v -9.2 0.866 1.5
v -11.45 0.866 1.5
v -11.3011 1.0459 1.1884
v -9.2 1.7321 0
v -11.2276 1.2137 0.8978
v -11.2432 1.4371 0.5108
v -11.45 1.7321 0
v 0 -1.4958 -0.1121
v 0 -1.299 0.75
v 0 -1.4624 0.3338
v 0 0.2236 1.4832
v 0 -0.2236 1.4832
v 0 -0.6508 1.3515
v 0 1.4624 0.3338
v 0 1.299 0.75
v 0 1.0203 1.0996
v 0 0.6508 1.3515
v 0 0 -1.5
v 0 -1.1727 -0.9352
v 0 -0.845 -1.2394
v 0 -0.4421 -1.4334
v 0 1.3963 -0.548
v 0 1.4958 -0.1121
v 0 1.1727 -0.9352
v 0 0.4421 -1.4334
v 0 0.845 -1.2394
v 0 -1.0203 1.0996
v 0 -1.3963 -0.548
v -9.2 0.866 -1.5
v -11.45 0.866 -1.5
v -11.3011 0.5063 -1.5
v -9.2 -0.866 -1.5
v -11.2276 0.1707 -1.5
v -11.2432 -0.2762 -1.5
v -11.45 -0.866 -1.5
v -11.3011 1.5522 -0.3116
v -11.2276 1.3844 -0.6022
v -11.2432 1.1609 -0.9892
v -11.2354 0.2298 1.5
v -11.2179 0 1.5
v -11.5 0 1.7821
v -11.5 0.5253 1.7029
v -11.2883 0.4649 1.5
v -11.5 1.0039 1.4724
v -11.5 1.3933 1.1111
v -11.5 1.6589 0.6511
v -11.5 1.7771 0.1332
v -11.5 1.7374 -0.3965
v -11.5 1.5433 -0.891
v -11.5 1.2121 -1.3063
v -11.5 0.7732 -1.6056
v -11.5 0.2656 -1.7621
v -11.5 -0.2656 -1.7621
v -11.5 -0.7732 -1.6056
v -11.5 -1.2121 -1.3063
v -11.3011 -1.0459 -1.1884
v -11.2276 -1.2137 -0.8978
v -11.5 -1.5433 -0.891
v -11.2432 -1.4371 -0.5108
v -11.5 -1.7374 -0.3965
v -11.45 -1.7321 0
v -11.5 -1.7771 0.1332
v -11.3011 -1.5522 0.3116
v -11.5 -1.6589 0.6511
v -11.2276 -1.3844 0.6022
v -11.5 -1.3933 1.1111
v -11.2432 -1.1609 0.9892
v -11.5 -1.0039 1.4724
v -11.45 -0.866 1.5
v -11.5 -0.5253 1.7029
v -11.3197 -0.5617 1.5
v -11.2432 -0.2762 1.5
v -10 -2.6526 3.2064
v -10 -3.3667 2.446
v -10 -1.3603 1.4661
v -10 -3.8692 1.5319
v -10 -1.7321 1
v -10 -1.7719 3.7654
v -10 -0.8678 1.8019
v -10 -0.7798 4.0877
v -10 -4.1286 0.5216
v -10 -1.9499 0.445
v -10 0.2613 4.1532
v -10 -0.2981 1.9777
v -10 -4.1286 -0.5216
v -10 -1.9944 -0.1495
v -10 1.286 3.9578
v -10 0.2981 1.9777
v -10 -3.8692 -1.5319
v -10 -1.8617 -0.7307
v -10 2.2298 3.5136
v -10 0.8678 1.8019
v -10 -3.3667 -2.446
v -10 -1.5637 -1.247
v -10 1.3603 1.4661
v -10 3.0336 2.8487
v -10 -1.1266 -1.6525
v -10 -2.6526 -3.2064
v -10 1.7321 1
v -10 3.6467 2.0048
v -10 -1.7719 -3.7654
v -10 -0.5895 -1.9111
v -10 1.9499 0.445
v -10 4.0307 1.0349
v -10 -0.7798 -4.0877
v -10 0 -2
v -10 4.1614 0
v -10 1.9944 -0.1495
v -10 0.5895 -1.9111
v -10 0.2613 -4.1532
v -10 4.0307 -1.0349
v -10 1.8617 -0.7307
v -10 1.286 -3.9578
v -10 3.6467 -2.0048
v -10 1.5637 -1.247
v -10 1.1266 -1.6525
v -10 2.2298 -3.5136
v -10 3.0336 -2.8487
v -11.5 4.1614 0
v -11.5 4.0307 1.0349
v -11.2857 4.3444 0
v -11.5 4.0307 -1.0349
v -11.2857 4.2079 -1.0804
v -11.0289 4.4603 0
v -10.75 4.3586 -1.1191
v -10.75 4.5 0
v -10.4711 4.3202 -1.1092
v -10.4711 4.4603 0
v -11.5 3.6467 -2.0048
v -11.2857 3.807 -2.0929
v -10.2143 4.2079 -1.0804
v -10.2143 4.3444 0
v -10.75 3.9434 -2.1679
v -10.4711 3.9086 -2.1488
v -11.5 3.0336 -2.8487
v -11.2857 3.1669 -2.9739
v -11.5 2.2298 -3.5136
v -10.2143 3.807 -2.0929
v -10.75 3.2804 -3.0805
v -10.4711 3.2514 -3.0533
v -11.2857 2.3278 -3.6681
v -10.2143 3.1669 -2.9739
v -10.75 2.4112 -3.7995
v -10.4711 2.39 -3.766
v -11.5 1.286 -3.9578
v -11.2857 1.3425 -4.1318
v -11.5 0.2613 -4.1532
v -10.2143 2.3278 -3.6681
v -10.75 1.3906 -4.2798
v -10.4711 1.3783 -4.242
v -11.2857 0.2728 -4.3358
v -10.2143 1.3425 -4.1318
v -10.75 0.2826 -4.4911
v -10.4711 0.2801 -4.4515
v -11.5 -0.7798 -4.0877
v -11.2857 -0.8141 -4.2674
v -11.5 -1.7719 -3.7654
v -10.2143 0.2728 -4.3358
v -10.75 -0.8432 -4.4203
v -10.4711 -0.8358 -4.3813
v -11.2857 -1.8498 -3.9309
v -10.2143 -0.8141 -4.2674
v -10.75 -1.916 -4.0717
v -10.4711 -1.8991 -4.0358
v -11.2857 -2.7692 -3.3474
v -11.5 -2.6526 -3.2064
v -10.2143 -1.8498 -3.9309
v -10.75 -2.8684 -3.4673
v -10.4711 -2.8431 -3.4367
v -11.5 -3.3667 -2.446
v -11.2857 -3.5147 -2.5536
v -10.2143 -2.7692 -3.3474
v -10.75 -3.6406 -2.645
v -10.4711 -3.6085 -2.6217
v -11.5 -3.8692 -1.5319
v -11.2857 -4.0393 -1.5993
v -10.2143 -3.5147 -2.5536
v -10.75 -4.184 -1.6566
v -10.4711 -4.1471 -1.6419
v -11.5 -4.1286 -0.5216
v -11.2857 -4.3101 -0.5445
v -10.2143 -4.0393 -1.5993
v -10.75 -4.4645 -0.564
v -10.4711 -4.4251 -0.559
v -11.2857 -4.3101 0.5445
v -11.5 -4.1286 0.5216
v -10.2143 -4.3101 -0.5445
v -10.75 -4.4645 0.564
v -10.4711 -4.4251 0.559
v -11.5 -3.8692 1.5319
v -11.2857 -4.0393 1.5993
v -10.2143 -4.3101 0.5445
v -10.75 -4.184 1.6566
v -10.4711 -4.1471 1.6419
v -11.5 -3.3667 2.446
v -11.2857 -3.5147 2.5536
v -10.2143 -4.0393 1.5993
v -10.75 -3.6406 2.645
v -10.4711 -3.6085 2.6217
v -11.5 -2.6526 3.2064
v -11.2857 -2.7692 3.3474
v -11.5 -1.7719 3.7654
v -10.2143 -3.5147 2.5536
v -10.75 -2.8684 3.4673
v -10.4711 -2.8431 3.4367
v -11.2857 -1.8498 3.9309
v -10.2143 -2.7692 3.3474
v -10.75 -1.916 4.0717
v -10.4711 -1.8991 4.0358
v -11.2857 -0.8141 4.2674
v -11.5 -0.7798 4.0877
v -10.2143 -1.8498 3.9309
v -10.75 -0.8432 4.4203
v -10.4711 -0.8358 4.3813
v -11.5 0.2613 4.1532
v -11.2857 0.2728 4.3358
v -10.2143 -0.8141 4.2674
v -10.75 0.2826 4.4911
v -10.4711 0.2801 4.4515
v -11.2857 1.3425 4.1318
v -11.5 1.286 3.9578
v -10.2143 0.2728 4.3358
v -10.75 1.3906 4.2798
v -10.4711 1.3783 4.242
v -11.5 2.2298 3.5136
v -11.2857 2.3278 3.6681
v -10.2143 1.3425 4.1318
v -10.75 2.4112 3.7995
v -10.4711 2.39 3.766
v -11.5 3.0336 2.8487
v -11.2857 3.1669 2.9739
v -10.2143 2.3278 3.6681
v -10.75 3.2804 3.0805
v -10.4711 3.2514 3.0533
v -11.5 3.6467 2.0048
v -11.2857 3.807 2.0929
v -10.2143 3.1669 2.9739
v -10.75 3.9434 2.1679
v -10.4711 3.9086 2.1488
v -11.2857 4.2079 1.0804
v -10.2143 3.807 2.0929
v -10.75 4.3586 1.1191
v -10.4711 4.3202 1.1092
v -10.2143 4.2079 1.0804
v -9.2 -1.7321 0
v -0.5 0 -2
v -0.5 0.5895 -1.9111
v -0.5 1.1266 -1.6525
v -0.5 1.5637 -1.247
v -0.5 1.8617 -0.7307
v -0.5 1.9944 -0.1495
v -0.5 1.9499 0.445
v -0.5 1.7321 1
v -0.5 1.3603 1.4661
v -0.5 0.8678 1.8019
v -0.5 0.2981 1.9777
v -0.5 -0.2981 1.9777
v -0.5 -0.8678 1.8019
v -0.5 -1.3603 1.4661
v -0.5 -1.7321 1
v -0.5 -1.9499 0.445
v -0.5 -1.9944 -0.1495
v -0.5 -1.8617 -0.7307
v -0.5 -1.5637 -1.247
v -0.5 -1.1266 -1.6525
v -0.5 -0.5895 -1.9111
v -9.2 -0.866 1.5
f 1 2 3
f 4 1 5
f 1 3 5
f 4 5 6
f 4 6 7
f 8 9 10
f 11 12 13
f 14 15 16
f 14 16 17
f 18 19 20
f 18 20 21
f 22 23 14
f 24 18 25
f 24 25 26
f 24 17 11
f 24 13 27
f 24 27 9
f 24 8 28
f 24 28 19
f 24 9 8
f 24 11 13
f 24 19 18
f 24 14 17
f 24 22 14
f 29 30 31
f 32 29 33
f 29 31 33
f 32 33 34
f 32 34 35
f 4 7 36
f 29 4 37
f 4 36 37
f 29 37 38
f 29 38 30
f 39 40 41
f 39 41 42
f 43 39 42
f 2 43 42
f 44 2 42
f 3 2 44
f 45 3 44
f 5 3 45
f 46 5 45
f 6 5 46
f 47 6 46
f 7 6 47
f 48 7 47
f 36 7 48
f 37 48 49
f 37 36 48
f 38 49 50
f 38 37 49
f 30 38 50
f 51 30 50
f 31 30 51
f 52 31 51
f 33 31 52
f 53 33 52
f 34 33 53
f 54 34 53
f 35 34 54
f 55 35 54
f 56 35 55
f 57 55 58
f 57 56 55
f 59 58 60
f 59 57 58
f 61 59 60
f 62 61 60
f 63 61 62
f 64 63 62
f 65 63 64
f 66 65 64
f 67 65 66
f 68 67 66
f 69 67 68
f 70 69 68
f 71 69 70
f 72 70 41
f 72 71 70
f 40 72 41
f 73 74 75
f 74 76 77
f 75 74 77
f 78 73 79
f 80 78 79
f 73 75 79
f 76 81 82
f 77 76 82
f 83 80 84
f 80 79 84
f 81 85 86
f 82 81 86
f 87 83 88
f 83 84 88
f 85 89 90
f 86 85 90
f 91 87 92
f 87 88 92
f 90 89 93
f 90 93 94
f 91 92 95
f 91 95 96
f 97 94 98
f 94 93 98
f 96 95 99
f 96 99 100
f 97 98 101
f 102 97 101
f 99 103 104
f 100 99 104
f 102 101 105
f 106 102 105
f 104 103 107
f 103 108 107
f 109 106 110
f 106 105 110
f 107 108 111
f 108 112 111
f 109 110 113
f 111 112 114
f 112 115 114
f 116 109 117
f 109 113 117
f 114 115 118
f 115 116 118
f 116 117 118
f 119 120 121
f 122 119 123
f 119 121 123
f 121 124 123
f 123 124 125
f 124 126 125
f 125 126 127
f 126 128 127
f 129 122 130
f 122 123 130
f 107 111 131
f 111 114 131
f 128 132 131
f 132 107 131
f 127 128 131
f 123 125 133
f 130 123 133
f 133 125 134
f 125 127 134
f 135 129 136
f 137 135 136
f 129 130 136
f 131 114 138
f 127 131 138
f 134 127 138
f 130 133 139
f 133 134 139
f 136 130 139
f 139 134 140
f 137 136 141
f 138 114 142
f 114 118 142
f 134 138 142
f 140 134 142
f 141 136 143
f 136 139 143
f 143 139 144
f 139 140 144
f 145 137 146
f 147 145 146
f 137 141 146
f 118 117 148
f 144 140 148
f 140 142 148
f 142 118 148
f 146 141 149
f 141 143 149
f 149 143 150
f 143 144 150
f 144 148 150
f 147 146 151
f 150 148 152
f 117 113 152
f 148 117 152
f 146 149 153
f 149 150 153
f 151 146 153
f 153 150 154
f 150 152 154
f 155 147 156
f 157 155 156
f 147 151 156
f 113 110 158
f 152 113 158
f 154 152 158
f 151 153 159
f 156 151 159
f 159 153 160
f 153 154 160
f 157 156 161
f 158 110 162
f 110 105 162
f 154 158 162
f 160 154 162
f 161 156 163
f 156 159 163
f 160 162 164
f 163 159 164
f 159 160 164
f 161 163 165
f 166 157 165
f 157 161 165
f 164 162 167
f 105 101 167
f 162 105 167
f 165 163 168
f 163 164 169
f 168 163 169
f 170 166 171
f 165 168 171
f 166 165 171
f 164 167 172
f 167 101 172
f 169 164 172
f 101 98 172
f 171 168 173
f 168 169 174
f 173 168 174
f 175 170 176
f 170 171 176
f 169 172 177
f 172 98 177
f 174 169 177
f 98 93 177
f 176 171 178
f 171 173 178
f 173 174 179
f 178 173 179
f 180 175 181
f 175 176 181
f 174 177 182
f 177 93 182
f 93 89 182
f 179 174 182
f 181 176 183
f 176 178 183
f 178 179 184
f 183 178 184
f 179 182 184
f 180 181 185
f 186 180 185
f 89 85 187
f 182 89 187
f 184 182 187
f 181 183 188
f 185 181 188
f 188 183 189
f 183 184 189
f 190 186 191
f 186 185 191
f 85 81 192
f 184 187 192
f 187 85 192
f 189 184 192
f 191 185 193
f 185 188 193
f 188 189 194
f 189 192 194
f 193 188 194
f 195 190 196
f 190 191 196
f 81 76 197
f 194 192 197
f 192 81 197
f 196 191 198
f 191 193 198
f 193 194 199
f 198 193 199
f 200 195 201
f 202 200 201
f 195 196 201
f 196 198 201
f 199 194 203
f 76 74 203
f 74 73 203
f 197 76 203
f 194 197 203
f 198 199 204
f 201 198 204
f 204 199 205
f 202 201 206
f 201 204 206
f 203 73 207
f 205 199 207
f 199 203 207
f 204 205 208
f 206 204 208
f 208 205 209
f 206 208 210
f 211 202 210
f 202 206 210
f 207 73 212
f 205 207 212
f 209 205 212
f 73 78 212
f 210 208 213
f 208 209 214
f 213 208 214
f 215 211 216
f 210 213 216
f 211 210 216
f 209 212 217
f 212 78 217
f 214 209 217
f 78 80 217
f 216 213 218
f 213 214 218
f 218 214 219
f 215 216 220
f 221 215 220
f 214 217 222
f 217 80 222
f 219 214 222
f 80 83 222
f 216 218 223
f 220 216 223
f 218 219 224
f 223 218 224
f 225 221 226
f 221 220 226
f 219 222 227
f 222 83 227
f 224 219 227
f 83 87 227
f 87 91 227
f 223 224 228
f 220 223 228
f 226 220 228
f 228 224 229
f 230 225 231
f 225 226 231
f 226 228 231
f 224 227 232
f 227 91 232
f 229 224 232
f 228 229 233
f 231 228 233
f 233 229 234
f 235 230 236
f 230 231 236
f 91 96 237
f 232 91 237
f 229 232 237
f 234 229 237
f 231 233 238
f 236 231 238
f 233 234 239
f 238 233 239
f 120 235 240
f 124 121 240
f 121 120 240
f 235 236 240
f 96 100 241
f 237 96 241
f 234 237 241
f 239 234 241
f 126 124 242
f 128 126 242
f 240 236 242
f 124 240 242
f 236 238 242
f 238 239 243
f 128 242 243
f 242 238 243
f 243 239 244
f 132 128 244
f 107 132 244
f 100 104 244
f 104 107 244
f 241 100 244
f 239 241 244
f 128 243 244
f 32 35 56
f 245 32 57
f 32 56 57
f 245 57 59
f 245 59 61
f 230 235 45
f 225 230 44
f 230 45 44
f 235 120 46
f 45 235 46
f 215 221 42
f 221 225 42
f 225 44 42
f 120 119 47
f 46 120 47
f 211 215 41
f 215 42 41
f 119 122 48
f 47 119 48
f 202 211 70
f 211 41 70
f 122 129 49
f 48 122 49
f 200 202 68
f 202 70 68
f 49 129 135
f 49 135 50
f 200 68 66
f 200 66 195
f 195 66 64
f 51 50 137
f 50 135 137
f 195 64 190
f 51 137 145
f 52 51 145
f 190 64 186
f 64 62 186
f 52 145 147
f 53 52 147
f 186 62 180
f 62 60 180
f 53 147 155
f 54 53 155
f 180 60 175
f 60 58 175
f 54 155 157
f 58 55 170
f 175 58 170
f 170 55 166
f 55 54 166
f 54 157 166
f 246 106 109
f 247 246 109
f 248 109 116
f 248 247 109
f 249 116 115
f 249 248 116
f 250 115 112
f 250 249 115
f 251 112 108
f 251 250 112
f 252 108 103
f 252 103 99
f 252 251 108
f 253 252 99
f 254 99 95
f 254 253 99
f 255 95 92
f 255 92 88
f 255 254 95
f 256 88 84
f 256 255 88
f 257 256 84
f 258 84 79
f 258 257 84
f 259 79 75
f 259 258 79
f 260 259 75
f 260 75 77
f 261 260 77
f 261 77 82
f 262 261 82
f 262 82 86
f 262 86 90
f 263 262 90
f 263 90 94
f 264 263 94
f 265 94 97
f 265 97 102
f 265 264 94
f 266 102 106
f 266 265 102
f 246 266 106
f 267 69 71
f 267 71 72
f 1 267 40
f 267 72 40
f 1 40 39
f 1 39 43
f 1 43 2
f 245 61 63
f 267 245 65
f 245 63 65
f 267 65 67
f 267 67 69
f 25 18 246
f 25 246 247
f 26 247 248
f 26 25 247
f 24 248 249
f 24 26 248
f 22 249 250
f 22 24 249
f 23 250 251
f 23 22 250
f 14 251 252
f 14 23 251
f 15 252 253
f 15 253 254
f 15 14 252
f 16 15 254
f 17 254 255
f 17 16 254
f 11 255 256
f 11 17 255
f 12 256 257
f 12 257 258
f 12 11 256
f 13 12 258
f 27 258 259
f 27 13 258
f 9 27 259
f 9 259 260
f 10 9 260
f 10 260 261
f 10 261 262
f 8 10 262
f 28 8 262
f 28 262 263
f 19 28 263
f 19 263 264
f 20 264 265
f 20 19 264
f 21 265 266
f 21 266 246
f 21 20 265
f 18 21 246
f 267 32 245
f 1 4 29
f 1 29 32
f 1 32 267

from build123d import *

# Parameters (mm, degrees)
SKETCH2_R           = 2
BOSS_EXTRUDE1_DEPTH = 10
CHAMFER1_SIZE       = 0.5
CUT_EXTRUDE1_DEPTH  = 2.3
SKETCH8_R           = 1.782050808
CUT_EXTRUDE2_DEPTH  = 1
CUT_EXTRUDE2_TAPER  = 45


with BuildPart() as part:
    # Sketch2 → Boss-Extrude1 (new body)
    with BuildSketch(Plane(origin=(0, 0, 0), x_dir=(0, 0, -1), z_dir=(1, 0, 0))):
        Circle(SKETCH2_R)
    extrude(amount=-BOSS_EXTRUDE1_DEPTH)

    # Chamfer1
    chamfer1_edges = [part.edges().sort_by_distance(p)[0] for p in [
        (0, 0, 2),
    ]]
    chamfer(chamfer1_edges, length=CHAMFER1_SIZE)

    # Sketch6 → Revolve1 (revolve)
    with BuildSketch(Plane.XY):
        with BuildLine():
            Line((-11.5, 0), (-11.5, 4.161437828))
            ThreePointArc((-11.5, 4.161437828), (-10.75, 4.5), (-10, 4.161437828))
            Line((-10, 4.161437828), (-10, 0))
            Line((-10, 0), (-11.5, 0))
        make_face()
    revolve(axis=Axis((-10, 0, 0), (-1, 0, 0)))

    # Sketch7 → Cut-Extrude1 (cut)
    with BuildSketch(Plane.ZY.offset(11.5)):
        Polygon((0, 1.732050808), (-1.5, 0.866025404), (-1.5, -0.866025404), (0, -1.732050808), (1.5, -0.866025404), (1.5, 0.866025404), align=None)
    extrude(amount=-CUT_EXTRUDE1_DEPTH, mode=Mode.SUBTRACT)

    # Sketch8 → Cut-Extrude2 (cut)
    with BuildSketch(Plane.ZY.offset(11.5)):
        Circle(SKETCH8_R)
    extrude(amount=-CUT_EXTRUDE2_DEPTH, taper=CUT_EXTRUDE2_TAPER, mode=Mode.SUBTRACT)


solid = part.part
